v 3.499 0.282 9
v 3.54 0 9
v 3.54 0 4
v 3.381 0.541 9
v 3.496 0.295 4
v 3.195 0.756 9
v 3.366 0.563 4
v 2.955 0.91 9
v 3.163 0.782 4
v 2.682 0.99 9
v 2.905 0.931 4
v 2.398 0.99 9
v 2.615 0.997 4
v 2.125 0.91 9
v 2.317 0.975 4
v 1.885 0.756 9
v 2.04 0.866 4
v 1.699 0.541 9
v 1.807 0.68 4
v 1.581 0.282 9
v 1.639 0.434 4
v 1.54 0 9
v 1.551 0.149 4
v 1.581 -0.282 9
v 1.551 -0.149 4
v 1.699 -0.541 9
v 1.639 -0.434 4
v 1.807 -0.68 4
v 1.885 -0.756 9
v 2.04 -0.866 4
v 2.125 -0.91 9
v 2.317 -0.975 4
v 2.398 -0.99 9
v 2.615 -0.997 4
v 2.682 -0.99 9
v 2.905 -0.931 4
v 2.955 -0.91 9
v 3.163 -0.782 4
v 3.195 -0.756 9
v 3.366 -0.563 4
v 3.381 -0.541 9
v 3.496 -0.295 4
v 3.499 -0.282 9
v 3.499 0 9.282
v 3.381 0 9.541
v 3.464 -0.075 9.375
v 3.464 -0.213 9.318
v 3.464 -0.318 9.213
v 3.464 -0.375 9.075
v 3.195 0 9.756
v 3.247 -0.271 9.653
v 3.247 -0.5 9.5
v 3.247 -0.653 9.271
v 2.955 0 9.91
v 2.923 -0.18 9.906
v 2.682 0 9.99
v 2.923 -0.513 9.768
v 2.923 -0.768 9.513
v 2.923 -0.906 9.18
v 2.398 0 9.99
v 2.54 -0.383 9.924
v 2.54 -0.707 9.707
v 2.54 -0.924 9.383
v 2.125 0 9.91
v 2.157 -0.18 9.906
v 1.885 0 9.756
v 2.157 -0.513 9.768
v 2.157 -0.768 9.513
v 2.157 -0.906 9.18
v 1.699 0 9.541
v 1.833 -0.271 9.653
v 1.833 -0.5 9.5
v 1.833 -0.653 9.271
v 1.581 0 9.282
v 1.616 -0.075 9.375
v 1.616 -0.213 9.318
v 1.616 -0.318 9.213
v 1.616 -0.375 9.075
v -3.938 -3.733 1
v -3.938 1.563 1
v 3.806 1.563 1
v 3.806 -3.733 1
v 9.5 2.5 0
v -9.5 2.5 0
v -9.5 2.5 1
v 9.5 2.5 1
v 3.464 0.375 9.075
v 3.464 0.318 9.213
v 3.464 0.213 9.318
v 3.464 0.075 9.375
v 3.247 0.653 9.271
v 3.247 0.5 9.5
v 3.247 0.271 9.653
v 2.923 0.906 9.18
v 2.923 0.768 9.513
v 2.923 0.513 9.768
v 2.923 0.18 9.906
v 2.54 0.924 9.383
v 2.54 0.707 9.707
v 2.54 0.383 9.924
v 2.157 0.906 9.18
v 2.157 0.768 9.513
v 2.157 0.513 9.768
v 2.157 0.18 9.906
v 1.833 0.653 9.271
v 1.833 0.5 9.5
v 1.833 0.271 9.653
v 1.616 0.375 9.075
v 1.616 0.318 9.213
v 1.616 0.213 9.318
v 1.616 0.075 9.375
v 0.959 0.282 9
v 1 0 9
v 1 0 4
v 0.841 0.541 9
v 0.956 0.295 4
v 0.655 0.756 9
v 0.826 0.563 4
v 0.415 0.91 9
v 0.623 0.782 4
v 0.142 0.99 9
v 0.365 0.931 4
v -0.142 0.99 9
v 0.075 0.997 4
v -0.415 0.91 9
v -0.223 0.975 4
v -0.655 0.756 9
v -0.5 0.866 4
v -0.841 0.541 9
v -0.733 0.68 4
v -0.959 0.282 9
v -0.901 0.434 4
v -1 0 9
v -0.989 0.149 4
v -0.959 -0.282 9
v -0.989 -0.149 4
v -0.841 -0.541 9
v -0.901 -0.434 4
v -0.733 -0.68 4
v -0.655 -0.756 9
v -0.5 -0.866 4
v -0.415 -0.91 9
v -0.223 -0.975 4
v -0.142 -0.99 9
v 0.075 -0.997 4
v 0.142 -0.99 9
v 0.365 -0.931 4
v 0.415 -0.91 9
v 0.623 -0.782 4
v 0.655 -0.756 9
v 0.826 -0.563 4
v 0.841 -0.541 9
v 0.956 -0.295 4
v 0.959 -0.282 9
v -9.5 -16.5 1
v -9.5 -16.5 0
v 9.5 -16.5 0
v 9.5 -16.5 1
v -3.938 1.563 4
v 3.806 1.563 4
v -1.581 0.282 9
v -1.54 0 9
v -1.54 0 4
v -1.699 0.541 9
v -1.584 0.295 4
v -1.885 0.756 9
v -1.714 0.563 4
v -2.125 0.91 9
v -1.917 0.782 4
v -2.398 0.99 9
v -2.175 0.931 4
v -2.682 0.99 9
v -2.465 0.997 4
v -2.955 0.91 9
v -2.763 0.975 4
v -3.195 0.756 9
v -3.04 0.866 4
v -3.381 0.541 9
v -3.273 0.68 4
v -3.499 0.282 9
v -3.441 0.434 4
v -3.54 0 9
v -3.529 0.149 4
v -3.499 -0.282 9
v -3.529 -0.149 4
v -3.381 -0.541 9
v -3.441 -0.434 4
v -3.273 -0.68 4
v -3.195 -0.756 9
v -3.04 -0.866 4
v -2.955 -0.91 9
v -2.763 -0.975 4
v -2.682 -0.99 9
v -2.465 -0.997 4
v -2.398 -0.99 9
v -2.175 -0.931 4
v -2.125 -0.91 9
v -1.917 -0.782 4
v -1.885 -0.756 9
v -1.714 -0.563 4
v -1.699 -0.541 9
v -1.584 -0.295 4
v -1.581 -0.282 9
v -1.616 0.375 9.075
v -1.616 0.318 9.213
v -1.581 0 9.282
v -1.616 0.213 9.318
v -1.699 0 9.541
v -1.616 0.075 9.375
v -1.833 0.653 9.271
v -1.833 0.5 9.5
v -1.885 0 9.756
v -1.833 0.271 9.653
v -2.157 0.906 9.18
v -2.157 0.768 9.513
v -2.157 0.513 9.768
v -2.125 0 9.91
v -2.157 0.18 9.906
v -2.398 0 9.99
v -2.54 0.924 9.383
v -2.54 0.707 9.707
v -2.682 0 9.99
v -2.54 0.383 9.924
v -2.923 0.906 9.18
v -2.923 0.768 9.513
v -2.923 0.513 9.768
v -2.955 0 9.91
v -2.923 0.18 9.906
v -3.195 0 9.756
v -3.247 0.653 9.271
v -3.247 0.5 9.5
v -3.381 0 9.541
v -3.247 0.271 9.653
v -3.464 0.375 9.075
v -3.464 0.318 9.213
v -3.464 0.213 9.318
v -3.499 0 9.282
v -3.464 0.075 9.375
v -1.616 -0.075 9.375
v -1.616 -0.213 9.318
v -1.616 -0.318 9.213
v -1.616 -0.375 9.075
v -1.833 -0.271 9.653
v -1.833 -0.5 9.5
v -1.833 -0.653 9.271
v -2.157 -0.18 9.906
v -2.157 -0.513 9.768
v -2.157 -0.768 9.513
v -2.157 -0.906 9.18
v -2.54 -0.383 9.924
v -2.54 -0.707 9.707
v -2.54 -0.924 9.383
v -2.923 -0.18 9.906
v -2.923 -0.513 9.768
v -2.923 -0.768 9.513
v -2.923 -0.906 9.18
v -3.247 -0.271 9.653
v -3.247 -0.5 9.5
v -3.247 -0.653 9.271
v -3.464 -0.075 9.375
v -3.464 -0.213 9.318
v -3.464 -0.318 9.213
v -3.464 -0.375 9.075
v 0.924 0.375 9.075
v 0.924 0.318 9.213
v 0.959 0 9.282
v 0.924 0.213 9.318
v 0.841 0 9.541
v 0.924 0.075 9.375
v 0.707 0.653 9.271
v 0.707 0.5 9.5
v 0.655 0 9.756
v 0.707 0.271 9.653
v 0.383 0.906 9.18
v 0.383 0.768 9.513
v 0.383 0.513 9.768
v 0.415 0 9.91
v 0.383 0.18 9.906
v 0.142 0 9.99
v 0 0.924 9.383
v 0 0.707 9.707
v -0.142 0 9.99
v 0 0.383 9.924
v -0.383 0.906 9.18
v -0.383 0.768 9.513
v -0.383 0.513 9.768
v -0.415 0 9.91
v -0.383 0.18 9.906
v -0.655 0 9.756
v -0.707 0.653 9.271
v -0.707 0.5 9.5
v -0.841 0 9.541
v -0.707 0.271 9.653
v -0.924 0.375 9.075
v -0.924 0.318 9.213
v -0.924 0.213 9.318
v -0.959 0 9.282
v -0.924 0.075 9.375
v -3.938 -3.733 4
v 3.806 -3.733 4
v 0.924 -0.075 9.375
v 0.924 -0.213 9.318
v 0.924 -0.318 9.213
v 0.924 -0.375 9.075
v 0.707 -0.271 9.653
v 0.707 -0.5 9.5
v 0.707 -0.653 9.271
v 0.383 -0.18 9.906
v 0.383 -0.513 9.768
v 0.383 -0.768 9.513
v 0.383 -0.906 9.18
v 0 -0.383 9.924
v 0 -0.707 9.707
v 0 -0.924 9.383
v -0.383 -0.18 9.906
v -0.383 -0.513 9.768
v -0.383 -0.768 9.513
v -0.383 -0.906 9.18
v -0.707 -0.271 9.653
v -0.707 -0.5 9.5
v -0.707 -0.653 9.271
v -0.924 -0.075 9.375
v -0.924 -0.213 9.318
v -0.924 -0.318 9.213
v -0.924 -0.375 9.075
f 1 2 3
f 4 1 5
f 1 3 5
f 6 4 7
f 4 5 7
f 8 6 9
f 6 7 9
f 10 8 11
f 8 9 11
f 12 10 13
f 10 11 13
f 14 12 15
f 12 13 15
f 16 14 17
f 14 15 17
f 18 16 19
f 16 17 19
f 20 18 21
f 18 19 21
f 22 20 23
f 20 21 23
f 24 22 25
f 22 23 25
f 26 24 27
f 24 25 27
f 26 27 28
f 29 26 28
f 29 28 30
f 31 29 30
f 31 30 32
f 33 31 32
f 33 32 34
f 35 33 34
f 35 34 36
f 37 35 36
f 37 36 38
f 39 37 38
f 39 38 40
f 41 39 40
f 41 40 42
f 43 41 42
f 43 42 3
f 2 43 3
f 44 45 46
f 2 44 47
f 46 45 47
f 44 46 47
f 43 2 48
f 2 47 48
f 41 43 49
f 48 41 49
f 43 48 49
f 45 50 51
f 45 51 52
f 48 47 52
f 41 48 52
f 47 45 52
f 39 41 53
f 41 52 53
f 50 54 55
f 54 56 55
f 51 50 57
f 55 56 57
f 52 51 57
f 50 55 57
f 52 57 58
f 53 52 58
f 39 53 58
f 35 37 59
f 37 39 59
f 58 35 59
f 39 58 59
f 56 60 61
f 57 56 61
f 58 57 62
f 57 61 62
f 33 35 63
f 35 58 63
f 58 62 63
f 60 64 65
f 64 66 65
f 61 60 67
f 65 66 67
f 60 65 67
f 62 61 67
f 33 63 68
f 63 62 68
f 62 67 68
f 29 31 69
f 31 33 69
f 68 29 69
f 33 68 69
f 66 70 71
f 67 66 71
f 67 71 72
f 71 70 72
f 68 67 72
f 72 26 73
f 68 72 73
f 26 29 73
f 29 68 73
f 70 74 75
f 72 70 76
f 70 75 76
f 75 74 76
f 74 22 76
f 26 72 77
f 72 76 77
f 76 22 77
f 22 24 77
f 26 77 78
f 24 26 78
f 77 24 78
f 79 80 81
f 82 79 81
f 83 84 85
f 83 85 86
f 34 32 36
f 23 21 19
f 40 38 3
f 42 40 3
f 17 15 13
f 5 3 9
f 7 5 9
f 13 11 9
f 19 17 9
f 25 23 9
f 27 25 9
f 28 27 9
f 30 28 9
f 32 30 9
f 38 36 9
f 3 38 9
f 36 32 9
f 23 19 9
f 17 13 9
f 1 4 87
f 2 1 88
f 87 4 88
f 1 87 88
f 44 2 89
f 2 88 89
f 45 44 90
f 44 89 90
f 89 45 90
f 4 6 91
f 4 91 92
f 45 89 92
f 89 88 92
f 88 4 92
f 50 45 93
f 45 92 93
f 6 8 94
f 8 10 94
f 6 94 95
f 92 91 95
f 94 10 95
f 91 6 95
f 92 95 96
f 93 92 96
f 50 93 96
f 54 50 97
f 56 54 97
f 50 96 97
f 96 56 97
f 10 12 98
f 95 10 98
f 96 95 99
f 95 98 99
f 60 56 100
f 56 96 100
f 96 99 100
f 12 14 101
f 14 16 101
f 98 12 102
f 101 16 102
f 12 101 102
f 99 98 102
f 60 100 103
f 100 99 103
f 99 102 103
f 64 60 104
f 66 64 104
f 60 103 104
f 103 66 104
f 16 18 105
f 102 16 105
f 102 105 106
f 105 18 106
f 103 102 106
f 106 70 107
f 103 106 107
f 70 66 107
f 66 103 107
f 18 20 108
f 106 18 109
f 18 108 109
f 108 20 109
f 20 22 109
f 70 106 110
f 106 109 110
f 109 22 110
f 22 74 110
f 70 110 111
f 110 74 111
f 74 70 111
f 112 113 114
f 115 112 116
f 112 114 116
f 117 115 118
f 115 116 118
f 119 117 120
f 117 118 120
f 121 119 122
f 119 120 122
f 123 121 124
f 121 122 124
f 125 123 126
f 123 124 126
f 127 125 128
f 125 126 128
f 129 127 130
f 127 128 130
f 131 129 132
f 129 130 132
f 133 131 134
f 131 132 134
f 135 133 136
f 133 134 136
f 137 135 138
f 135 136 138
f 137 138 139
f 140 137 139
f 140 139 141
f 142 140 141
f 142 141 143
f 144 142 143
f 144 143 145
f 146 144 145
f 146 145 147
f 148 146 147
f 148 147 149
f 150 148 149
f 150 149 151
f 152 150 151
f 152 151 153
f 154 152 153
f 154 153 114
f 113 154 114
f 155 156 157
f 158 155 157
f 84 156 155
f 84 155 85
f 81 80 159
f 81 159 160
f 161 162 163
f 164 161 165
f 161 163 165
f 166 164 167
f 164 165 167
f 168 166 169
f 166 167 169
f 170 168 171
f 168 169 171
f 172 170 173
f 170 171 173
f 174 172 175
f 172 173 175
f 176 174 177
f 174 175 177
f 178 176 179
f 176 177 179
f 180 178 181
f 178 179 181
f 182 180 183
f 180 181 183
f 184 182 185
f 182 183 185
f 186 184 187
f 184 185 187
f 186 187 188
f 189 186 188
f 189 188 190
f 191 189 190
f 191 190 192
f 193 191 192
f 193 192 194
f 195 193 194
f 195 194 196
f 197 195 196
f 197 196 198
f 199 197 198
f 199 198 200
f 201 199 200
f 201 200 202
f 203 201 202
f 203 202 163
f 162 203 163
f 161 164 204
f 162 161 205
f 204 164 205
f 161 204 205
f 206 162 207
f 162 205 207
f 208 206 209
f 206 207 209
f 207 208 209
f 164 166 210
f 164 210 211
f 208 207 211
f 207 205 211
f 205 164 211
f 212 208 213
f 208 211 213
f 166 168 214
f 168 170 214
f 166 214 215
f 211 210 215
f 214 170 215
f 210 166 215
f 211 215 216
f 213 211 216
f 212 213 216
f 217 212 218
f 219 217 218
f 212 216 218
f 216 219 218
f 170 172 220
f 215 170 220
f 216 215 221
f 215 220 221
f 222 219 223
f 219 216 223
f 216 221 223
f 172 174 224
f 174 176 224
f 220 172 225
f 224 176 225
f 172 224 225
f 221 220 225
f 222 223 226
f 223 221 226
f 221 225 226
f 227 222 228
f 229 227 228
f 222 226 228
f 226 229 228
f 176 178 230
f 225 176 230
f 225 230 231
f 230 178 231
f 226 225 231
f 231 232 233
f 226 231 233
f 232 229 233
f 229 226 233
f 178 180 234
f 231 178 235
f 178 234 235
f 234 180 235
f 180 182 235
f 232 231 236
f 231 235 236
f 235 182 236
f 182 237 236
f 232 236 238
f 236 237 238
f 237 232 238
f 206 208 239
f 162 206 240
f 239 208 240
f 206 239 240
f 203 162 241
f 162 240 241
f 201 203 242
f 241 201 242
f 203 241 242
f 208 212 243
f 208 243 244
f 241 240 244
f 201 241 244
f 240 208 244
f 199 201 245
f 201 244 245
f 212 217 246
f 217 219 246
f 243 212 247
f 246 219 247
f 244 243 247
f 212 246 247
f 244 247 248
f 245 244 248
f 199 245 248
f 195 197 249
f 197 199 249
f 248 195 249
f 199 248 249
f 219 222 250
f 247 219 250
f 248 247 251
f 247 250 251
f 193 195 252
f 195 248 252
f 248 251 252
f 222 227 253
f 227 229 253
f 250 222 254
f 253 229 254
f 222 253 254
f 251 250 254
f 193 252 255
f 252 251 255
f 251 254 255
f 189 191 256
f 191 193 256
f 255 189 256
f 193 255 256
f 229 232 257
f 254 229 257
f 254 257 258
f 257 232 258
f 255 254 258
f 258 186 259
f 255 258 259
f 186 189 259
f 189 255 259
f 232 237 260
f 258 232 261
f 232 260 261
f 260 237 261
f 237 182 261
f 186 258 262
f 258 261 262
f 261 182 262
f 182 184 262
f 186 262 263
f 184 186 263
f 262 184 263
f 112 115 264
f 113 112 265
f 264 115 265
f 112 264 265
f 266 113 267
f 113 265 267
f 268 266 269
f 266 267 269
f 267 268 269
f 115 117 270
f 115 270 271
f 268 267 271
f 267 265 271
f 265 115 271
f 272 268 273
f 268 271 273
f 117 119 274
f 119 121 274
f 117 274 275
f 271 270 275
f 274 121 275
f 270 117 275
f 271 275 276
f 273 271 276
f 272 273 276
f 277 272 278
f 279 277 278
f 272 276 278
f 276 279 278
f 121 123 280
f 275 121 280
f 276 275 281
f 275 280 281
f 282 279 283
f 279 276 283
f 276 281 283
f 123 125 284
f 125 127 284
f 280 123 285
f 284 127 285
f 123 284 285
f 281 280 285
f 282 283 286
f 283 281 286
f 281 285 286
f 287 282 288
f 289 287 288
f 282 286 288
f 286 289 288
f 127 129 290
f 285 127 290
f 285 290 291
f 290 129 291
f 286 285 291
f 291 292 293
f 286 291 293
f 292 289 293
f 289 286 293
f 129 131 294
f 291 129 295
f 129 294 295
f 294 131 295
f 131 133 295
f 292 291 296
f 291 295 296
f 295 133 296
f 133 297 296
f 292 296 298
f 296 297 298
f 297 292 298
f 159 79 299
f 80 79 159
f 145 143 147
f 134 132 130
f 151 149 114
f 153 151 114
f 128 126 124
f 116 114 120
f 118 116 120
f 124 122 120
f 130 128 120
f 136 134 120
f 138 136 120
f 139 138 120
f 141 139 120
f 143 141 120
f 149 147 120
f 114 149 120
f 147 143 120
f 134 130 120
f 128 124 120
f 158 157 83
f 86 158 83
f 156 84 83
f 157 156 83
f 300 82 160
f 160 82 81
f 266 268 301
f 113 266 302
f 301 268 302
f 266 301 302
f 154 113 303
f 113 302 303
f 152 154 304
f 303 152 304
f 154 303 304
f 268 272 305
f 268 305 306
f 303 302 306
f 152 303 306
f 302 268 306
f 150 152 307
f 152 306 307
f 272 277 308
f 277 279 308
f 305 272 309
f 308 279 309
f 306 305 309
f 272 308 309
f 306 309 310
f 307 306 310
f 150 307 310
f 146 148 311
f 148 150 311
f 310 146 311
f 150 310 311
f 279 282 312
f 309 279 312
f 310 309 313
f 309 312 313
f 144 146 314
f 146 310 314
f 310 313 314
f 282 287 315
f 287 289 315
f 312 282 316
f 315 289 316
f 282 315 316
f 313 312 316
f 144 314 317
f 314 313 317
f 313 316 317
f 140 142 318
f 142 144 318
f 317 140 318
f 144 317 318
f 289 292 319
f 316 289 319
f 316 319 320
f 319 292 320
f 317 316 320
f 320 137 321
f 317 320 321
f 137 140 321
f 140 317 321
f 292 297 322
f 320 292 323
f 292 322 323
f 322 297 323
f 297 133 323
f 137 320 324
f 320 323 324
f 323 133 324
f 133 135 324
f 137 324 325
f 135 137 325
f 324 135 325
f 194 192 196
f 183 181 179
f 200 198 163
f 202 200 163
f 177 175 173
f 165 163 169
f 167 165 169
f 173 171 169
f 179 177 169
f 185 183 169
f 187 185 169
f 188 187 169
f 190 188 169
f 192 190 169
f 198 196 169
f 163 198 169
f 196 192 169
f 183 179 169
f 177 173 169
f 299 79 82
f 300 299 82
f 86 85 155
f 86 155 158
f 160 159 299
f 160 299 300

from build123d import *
from build123d import SkipClean  # not in build123d's __all__

# Parameters (mm, degrees)
F0_W     = 19
F0_H     = 19
F1_DEPTH = 1
F2_W     = 7.7446724754
F2_H     = 5.2963567432
F3_DEPTH = 3
F4_R     = 1
F5_DEPTH = 5


with BuildPart() as f1:
    # F0 (on Top) → F1 (new body)
    with BuildSketch(Plane.XY):
        with Locations((0, -7)):
            Rectangle(F0_W, F0_H)
    extrude(amount=F1_DEPTH)


with BuildPart() as f3:
    # F2 (on face) → F3 (new body)
    with BuildSketch(Plane.XY.offset(1)):
        with Locations((-0.065915403, -1.0850959225)):
            Rectangle(F2_W, F2_H)
    extrude(amount=F3_DEPTH)


with BuildPart() as f5:
    # F4 (on face) → F5 (new body)
    with BuildSketch(Plane.XY.offset(4)):
        with Locations((-2.54, 0)):
            Circle(F4_R)
    extrude(amount=F5_DEPTH)

    # F6 (on Front) → F7, piece 3 (revolve)
    with BuildSketch(Plane.XZ):
        with BuildLine():
            Line((-3.54, 9), (-1.54, 9))
            ThreePointArc((-1.54, 9), (-2.54, 10), (-3.54, 9))
        make_face()
    with SkipClean():  # cleaning this boolean's faces spoils the solid; the shape is the same uncleaned
        revolve(axis=Axis((0, 0, 9), (1, 0, 0)))


with BuildPart() as f5b:
    # F4 (on face) → F5, piece 2 (new body)
    with BuildSketch(Plane.XY.offset(4)):
        Circle(F4_R)
    extrude(amount=F5_DEPTH)

    # F6 (on Front) → F7 (revolve)
    with BuildSketch(Plane.XZ):
        with BuildLine():
            Line((-1, 9), (1, 9))
            ThreePointArc((1, 9), (0, 10), (-1, 9))
        make_face()
    with SkipClean():  # cleaning this boolean's faces spoils the solid; the shape is the same uncleaned
        revolve(axis=Axis((0, 0, 9), (1, 0, 0)))


with BuildPart() as f5c:
    # F4 (on face) → F5, piece 3 (new body)
    with BuildSketch(Plane.XY.offset(4)):
        with Locations((2.54, 0)):
            Circle(F4_R)
    extrude(amount=F5_DEPTH)

    # F6 (on Front) → F7, piece 2 (revolve)
    with BuildSketch(Plane.XZ):
        with BuildLine():
            Line((1.54, 9), (3.54, 9))
            ThreePointArc((3.54, 9), (2.54, 10), (1.54, 9))
        make_face()
    with SkipClean():  # cleaning this boolean's faces spoils the solid; the shape is the same uncleaned
        revolve(axis=Axis((0, 0, 9), (1, 0, 0)))


solid = Compound([f1.part, f3.part, f5.part, f5b.part, f5c.part])
